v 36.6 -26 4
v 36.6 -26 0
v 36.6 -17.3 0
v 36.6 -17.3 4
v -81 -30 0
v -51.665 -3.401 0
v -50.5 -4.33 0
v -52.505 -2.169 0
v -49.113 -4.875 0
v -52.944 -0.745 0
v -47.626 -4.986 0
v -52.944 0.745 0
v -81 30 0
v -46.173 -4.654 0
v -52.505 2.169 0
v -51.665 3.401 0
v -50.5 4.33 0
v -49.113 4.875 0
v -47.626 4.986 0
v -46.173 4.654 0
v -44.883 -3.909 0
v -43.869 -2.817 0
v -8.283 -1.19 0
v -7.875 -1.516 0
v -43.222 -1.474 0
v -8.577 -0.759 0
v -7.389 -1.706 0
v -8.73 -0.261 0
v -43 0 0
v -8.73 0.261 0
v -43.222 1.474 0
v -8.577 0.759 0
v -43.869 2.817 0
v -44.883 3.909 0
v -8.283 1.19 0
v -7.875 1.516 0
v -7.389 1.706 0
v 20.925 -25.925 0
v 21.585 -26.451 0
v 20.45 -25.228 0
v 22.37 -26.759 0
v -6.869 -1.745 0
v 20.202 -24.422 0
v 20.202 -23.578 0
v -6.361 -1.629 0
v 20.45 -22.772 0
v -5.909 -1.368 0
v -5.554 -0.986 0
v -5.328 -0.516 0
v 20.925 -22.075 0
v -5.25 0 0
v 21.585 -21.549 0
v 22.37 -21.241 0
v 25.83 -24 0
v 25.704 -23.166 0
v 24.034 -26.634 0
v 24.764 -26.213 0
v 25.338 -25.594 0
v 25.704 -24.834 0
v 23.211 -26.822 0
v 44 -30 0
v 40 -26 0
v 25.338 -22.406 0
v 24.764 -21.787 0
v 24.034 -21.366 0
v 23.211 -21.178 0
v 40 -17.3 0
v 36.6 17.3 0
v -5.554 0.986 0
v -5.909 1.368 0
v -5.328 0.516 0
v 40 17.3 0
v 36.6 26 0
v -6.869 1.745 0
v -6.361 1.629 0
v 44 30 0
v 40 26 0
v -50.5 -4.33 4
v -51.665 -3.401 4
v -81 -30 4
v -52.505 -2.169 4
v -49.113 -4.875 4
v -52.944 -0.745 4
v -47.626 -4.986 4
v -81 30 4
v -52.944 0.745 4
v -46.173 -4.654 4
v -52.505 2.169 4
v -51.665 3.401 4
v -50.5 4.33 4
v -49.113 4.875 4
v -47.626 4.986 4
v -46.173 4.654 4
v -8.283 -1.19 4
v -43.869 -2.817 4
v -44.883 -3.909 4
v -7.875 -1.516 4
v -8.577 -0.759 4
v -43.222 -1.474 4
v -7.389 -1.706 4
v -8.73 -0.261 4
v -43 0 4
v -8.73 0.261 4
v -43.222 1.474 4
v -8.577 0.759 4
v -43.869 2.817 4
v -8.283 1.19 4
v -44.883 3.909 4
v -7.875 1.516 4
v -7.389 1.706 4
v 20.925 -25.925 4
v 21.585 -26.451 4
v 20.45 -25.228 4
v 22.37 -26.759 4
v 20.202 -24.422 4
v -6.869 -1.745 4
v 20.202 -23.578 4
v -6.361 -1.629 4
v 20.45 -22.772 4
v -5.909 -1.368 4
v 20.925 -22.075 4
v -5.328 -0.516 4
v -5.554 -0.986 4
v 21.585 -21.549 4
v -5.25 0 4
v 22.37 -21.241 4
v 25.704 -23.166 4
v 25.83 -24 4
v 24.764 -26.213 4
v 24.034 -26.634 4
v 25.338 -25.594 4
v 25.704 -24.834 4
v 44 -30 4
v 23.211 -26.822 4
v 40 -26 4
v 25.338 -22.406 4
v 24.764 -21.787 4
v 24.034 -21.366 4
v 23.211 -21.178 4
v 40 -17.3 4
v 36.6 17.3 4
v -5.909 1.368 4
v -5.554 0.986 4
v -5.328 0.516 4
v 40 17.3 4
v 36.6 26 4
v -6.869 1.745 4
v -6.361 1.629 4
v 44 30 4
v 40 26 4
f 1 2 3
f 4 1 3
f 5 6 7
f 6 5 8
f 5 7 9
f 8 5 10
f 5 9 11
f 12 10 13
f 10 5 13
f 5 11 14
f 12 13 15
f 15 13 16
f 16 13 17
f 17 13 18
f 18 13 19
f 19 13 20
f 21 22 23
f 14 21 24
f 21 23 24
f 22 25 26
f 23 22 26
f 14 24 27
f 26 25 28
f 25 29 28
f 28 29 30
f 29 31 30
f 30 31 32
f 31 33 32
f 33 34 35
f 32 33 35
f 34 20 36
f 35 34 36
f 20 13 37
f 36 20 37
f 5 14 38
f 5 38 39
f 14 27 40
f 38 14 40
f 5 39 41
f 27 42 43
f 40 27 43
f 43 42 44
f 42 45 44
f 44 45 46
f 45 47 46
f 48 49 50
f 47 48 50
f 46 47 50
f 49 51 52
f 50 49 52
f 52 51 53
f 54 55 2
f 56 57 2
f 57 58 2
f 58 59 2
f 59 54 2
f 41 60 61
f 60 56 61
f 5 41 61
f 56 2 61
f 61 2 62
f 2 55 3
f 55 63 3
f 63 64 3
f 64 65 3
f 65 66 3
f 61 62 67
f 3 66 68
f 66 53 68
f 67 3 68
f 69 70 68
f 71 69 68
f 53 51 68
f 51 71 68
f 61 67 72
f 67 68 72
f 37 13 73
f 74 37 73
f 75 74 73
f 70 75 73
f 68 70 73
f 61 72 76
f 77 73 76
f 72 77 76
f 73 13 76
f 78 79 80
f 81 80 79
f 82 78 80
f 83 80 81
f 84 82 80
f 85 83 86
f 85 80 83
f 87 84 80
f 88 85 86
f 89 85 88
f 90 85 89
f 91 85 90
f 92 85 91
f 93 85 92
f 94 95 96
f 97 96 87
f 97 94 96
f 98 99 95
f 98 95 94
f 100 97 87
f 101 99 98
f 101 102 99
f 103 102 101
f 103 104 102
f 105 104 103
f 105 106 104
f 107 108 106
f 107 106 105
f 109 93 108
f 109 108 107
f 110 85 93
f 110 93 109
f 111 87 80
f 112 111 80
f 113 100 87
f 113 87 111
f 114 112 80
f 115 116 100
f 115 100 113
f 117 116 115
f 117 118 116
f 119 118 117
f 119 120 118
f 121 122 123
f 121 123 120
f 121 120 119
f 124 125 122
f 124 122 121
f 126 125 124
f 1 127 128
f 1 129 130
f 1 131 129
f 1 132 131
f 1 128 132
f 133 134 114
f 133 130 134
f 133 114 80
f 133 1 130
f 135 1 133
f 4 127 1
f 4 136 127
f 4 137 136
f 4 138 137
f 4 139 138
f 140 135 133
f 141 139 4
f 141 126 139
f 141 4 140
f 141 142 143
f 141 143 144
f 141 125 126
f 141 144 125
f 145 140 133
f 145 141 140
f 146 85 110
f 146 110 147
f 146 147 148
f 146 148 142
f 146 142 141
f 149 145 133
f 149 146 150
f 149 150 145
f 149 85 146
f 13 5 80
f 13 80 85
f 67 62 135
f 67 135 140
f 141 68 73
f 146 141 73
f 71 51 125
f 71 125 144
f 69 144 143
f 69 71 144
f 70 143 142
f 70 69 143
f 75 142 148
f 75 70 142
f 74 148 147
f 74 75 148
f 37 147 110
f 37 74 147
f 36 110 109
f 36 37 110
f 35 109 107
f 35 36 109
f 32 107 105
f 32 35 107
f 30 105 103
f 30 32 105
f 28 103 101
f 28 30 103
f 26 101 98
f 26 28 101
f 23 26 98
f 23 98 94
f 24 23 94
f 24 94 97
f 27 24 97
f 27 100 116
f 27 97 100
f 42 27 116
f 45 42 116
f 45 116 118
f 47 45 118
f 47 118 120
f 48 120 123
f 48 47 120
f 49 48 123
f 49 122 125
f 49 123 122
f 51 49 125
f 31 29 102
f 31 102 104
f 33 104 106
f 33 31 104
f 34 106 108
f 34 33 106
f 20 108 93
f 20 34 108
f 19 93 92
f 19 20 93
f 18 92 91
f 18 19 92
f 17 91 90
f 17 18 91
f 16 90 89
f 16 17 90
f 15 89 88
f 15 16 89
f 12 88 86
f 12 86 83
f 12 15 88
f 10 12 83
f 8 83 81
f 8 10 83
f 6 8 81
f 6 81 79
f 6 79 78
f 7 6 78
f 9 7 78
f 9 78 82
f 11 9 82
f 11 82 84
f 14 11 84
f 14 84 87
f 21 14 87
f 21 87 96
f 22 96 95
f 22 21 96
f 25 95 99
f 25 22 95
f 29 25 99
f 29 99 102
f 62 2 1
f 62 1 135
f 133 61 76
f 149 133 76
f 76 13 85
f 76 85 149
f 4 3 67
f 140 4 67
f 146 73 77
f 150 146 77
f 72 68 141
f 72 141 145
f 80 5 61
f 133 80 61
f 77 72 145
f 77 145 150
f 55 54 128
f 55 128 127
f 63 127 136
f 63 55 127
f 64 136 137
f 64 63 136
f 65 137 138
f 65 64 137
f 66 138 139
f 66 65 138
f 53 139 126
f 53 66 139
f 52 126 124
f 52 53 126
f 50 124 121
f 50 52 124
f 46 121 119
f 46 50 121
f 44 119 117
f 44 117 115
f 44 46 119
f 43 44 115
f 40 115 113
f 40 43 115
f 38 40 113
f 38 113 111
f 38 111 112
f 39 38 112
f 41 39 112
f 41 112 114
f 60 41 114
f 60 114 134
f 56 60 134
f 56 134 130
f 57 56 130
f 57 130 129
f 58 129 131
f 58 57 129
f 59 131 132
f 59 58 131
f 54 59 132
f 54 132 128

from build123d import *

# Parameters (mm, degrees)
SKETCH1_W               = 121
SKETCH1_H               = 60
SKETCH1_R               = 5
SKETCH1_R_2             = 2.83
BOSS_EXTRUDE1_DEPTH     = 4
SKETCH2_W               = 4
SKETCH2_H               = 60
BOSS_EXTRUDE2_DEPTH     = 4
CUT_EXTRUDE1_DEPTH      = 87.469647854
CUT_EXTRUDE1_DEPTH_BACK = 87.469647854
SKETCH3_R               = 1.75
SKETCH3_W               = 3.4
SKETCH3_H               = 8.7


with BuildPart() as part:
    # Sketch1 → Boss-Extrude1 (new body)
    with BuildSketch(Plane.XY):
        with Locations((-20.5, 0)):
            Rectangle(SKETCH1_W, SKETCH1_H)
        with Locations((-48, 0)):
            Circle(SKETCH1_R, mode=Mode.SUBTRACT)
        with Locations((23, -24)):
            Circle(SKETCH1_R_2, mode=Mode.SUBTRACT)
    extrude(amount=BOSS_EXTRUDE1_DEPTH)

    # Sketch2 → Boss-Extrude2 (add)
    with BuildSketch(Plane.XY):
        with Locations((42, 0)):
            Rectangle(SKETCH2_W, SKETCH2_H)
    extrude(amount=BOSS_EXTRUDE2_DEPTH)

    # Sketch3 → Cut-Extrude1 (cut, two sides: drawn at the far end of the back side and taken through both)
    with BuildSketch(Plane.XY.offset(-CUT_EXTRUDE1_DEPTH_BACK)):
        with Locations((-7, 0)):
            Circle(SKETCH3_R)
        with Locations((38.3, 21.65)):
            Rectangle(SKETCH3_W, SKETCH3_H)
        with Locations((38.3, -21.65)):
            Rectangle(SKETCH3_W, SKETCH3_H)
    extrude(amount=CUT_EXTRUDE1_DEPTH + CUT_EXTRUDE1_DEPTH_BACK, mode=Mode.SUBTRACT)


solid = part.part
